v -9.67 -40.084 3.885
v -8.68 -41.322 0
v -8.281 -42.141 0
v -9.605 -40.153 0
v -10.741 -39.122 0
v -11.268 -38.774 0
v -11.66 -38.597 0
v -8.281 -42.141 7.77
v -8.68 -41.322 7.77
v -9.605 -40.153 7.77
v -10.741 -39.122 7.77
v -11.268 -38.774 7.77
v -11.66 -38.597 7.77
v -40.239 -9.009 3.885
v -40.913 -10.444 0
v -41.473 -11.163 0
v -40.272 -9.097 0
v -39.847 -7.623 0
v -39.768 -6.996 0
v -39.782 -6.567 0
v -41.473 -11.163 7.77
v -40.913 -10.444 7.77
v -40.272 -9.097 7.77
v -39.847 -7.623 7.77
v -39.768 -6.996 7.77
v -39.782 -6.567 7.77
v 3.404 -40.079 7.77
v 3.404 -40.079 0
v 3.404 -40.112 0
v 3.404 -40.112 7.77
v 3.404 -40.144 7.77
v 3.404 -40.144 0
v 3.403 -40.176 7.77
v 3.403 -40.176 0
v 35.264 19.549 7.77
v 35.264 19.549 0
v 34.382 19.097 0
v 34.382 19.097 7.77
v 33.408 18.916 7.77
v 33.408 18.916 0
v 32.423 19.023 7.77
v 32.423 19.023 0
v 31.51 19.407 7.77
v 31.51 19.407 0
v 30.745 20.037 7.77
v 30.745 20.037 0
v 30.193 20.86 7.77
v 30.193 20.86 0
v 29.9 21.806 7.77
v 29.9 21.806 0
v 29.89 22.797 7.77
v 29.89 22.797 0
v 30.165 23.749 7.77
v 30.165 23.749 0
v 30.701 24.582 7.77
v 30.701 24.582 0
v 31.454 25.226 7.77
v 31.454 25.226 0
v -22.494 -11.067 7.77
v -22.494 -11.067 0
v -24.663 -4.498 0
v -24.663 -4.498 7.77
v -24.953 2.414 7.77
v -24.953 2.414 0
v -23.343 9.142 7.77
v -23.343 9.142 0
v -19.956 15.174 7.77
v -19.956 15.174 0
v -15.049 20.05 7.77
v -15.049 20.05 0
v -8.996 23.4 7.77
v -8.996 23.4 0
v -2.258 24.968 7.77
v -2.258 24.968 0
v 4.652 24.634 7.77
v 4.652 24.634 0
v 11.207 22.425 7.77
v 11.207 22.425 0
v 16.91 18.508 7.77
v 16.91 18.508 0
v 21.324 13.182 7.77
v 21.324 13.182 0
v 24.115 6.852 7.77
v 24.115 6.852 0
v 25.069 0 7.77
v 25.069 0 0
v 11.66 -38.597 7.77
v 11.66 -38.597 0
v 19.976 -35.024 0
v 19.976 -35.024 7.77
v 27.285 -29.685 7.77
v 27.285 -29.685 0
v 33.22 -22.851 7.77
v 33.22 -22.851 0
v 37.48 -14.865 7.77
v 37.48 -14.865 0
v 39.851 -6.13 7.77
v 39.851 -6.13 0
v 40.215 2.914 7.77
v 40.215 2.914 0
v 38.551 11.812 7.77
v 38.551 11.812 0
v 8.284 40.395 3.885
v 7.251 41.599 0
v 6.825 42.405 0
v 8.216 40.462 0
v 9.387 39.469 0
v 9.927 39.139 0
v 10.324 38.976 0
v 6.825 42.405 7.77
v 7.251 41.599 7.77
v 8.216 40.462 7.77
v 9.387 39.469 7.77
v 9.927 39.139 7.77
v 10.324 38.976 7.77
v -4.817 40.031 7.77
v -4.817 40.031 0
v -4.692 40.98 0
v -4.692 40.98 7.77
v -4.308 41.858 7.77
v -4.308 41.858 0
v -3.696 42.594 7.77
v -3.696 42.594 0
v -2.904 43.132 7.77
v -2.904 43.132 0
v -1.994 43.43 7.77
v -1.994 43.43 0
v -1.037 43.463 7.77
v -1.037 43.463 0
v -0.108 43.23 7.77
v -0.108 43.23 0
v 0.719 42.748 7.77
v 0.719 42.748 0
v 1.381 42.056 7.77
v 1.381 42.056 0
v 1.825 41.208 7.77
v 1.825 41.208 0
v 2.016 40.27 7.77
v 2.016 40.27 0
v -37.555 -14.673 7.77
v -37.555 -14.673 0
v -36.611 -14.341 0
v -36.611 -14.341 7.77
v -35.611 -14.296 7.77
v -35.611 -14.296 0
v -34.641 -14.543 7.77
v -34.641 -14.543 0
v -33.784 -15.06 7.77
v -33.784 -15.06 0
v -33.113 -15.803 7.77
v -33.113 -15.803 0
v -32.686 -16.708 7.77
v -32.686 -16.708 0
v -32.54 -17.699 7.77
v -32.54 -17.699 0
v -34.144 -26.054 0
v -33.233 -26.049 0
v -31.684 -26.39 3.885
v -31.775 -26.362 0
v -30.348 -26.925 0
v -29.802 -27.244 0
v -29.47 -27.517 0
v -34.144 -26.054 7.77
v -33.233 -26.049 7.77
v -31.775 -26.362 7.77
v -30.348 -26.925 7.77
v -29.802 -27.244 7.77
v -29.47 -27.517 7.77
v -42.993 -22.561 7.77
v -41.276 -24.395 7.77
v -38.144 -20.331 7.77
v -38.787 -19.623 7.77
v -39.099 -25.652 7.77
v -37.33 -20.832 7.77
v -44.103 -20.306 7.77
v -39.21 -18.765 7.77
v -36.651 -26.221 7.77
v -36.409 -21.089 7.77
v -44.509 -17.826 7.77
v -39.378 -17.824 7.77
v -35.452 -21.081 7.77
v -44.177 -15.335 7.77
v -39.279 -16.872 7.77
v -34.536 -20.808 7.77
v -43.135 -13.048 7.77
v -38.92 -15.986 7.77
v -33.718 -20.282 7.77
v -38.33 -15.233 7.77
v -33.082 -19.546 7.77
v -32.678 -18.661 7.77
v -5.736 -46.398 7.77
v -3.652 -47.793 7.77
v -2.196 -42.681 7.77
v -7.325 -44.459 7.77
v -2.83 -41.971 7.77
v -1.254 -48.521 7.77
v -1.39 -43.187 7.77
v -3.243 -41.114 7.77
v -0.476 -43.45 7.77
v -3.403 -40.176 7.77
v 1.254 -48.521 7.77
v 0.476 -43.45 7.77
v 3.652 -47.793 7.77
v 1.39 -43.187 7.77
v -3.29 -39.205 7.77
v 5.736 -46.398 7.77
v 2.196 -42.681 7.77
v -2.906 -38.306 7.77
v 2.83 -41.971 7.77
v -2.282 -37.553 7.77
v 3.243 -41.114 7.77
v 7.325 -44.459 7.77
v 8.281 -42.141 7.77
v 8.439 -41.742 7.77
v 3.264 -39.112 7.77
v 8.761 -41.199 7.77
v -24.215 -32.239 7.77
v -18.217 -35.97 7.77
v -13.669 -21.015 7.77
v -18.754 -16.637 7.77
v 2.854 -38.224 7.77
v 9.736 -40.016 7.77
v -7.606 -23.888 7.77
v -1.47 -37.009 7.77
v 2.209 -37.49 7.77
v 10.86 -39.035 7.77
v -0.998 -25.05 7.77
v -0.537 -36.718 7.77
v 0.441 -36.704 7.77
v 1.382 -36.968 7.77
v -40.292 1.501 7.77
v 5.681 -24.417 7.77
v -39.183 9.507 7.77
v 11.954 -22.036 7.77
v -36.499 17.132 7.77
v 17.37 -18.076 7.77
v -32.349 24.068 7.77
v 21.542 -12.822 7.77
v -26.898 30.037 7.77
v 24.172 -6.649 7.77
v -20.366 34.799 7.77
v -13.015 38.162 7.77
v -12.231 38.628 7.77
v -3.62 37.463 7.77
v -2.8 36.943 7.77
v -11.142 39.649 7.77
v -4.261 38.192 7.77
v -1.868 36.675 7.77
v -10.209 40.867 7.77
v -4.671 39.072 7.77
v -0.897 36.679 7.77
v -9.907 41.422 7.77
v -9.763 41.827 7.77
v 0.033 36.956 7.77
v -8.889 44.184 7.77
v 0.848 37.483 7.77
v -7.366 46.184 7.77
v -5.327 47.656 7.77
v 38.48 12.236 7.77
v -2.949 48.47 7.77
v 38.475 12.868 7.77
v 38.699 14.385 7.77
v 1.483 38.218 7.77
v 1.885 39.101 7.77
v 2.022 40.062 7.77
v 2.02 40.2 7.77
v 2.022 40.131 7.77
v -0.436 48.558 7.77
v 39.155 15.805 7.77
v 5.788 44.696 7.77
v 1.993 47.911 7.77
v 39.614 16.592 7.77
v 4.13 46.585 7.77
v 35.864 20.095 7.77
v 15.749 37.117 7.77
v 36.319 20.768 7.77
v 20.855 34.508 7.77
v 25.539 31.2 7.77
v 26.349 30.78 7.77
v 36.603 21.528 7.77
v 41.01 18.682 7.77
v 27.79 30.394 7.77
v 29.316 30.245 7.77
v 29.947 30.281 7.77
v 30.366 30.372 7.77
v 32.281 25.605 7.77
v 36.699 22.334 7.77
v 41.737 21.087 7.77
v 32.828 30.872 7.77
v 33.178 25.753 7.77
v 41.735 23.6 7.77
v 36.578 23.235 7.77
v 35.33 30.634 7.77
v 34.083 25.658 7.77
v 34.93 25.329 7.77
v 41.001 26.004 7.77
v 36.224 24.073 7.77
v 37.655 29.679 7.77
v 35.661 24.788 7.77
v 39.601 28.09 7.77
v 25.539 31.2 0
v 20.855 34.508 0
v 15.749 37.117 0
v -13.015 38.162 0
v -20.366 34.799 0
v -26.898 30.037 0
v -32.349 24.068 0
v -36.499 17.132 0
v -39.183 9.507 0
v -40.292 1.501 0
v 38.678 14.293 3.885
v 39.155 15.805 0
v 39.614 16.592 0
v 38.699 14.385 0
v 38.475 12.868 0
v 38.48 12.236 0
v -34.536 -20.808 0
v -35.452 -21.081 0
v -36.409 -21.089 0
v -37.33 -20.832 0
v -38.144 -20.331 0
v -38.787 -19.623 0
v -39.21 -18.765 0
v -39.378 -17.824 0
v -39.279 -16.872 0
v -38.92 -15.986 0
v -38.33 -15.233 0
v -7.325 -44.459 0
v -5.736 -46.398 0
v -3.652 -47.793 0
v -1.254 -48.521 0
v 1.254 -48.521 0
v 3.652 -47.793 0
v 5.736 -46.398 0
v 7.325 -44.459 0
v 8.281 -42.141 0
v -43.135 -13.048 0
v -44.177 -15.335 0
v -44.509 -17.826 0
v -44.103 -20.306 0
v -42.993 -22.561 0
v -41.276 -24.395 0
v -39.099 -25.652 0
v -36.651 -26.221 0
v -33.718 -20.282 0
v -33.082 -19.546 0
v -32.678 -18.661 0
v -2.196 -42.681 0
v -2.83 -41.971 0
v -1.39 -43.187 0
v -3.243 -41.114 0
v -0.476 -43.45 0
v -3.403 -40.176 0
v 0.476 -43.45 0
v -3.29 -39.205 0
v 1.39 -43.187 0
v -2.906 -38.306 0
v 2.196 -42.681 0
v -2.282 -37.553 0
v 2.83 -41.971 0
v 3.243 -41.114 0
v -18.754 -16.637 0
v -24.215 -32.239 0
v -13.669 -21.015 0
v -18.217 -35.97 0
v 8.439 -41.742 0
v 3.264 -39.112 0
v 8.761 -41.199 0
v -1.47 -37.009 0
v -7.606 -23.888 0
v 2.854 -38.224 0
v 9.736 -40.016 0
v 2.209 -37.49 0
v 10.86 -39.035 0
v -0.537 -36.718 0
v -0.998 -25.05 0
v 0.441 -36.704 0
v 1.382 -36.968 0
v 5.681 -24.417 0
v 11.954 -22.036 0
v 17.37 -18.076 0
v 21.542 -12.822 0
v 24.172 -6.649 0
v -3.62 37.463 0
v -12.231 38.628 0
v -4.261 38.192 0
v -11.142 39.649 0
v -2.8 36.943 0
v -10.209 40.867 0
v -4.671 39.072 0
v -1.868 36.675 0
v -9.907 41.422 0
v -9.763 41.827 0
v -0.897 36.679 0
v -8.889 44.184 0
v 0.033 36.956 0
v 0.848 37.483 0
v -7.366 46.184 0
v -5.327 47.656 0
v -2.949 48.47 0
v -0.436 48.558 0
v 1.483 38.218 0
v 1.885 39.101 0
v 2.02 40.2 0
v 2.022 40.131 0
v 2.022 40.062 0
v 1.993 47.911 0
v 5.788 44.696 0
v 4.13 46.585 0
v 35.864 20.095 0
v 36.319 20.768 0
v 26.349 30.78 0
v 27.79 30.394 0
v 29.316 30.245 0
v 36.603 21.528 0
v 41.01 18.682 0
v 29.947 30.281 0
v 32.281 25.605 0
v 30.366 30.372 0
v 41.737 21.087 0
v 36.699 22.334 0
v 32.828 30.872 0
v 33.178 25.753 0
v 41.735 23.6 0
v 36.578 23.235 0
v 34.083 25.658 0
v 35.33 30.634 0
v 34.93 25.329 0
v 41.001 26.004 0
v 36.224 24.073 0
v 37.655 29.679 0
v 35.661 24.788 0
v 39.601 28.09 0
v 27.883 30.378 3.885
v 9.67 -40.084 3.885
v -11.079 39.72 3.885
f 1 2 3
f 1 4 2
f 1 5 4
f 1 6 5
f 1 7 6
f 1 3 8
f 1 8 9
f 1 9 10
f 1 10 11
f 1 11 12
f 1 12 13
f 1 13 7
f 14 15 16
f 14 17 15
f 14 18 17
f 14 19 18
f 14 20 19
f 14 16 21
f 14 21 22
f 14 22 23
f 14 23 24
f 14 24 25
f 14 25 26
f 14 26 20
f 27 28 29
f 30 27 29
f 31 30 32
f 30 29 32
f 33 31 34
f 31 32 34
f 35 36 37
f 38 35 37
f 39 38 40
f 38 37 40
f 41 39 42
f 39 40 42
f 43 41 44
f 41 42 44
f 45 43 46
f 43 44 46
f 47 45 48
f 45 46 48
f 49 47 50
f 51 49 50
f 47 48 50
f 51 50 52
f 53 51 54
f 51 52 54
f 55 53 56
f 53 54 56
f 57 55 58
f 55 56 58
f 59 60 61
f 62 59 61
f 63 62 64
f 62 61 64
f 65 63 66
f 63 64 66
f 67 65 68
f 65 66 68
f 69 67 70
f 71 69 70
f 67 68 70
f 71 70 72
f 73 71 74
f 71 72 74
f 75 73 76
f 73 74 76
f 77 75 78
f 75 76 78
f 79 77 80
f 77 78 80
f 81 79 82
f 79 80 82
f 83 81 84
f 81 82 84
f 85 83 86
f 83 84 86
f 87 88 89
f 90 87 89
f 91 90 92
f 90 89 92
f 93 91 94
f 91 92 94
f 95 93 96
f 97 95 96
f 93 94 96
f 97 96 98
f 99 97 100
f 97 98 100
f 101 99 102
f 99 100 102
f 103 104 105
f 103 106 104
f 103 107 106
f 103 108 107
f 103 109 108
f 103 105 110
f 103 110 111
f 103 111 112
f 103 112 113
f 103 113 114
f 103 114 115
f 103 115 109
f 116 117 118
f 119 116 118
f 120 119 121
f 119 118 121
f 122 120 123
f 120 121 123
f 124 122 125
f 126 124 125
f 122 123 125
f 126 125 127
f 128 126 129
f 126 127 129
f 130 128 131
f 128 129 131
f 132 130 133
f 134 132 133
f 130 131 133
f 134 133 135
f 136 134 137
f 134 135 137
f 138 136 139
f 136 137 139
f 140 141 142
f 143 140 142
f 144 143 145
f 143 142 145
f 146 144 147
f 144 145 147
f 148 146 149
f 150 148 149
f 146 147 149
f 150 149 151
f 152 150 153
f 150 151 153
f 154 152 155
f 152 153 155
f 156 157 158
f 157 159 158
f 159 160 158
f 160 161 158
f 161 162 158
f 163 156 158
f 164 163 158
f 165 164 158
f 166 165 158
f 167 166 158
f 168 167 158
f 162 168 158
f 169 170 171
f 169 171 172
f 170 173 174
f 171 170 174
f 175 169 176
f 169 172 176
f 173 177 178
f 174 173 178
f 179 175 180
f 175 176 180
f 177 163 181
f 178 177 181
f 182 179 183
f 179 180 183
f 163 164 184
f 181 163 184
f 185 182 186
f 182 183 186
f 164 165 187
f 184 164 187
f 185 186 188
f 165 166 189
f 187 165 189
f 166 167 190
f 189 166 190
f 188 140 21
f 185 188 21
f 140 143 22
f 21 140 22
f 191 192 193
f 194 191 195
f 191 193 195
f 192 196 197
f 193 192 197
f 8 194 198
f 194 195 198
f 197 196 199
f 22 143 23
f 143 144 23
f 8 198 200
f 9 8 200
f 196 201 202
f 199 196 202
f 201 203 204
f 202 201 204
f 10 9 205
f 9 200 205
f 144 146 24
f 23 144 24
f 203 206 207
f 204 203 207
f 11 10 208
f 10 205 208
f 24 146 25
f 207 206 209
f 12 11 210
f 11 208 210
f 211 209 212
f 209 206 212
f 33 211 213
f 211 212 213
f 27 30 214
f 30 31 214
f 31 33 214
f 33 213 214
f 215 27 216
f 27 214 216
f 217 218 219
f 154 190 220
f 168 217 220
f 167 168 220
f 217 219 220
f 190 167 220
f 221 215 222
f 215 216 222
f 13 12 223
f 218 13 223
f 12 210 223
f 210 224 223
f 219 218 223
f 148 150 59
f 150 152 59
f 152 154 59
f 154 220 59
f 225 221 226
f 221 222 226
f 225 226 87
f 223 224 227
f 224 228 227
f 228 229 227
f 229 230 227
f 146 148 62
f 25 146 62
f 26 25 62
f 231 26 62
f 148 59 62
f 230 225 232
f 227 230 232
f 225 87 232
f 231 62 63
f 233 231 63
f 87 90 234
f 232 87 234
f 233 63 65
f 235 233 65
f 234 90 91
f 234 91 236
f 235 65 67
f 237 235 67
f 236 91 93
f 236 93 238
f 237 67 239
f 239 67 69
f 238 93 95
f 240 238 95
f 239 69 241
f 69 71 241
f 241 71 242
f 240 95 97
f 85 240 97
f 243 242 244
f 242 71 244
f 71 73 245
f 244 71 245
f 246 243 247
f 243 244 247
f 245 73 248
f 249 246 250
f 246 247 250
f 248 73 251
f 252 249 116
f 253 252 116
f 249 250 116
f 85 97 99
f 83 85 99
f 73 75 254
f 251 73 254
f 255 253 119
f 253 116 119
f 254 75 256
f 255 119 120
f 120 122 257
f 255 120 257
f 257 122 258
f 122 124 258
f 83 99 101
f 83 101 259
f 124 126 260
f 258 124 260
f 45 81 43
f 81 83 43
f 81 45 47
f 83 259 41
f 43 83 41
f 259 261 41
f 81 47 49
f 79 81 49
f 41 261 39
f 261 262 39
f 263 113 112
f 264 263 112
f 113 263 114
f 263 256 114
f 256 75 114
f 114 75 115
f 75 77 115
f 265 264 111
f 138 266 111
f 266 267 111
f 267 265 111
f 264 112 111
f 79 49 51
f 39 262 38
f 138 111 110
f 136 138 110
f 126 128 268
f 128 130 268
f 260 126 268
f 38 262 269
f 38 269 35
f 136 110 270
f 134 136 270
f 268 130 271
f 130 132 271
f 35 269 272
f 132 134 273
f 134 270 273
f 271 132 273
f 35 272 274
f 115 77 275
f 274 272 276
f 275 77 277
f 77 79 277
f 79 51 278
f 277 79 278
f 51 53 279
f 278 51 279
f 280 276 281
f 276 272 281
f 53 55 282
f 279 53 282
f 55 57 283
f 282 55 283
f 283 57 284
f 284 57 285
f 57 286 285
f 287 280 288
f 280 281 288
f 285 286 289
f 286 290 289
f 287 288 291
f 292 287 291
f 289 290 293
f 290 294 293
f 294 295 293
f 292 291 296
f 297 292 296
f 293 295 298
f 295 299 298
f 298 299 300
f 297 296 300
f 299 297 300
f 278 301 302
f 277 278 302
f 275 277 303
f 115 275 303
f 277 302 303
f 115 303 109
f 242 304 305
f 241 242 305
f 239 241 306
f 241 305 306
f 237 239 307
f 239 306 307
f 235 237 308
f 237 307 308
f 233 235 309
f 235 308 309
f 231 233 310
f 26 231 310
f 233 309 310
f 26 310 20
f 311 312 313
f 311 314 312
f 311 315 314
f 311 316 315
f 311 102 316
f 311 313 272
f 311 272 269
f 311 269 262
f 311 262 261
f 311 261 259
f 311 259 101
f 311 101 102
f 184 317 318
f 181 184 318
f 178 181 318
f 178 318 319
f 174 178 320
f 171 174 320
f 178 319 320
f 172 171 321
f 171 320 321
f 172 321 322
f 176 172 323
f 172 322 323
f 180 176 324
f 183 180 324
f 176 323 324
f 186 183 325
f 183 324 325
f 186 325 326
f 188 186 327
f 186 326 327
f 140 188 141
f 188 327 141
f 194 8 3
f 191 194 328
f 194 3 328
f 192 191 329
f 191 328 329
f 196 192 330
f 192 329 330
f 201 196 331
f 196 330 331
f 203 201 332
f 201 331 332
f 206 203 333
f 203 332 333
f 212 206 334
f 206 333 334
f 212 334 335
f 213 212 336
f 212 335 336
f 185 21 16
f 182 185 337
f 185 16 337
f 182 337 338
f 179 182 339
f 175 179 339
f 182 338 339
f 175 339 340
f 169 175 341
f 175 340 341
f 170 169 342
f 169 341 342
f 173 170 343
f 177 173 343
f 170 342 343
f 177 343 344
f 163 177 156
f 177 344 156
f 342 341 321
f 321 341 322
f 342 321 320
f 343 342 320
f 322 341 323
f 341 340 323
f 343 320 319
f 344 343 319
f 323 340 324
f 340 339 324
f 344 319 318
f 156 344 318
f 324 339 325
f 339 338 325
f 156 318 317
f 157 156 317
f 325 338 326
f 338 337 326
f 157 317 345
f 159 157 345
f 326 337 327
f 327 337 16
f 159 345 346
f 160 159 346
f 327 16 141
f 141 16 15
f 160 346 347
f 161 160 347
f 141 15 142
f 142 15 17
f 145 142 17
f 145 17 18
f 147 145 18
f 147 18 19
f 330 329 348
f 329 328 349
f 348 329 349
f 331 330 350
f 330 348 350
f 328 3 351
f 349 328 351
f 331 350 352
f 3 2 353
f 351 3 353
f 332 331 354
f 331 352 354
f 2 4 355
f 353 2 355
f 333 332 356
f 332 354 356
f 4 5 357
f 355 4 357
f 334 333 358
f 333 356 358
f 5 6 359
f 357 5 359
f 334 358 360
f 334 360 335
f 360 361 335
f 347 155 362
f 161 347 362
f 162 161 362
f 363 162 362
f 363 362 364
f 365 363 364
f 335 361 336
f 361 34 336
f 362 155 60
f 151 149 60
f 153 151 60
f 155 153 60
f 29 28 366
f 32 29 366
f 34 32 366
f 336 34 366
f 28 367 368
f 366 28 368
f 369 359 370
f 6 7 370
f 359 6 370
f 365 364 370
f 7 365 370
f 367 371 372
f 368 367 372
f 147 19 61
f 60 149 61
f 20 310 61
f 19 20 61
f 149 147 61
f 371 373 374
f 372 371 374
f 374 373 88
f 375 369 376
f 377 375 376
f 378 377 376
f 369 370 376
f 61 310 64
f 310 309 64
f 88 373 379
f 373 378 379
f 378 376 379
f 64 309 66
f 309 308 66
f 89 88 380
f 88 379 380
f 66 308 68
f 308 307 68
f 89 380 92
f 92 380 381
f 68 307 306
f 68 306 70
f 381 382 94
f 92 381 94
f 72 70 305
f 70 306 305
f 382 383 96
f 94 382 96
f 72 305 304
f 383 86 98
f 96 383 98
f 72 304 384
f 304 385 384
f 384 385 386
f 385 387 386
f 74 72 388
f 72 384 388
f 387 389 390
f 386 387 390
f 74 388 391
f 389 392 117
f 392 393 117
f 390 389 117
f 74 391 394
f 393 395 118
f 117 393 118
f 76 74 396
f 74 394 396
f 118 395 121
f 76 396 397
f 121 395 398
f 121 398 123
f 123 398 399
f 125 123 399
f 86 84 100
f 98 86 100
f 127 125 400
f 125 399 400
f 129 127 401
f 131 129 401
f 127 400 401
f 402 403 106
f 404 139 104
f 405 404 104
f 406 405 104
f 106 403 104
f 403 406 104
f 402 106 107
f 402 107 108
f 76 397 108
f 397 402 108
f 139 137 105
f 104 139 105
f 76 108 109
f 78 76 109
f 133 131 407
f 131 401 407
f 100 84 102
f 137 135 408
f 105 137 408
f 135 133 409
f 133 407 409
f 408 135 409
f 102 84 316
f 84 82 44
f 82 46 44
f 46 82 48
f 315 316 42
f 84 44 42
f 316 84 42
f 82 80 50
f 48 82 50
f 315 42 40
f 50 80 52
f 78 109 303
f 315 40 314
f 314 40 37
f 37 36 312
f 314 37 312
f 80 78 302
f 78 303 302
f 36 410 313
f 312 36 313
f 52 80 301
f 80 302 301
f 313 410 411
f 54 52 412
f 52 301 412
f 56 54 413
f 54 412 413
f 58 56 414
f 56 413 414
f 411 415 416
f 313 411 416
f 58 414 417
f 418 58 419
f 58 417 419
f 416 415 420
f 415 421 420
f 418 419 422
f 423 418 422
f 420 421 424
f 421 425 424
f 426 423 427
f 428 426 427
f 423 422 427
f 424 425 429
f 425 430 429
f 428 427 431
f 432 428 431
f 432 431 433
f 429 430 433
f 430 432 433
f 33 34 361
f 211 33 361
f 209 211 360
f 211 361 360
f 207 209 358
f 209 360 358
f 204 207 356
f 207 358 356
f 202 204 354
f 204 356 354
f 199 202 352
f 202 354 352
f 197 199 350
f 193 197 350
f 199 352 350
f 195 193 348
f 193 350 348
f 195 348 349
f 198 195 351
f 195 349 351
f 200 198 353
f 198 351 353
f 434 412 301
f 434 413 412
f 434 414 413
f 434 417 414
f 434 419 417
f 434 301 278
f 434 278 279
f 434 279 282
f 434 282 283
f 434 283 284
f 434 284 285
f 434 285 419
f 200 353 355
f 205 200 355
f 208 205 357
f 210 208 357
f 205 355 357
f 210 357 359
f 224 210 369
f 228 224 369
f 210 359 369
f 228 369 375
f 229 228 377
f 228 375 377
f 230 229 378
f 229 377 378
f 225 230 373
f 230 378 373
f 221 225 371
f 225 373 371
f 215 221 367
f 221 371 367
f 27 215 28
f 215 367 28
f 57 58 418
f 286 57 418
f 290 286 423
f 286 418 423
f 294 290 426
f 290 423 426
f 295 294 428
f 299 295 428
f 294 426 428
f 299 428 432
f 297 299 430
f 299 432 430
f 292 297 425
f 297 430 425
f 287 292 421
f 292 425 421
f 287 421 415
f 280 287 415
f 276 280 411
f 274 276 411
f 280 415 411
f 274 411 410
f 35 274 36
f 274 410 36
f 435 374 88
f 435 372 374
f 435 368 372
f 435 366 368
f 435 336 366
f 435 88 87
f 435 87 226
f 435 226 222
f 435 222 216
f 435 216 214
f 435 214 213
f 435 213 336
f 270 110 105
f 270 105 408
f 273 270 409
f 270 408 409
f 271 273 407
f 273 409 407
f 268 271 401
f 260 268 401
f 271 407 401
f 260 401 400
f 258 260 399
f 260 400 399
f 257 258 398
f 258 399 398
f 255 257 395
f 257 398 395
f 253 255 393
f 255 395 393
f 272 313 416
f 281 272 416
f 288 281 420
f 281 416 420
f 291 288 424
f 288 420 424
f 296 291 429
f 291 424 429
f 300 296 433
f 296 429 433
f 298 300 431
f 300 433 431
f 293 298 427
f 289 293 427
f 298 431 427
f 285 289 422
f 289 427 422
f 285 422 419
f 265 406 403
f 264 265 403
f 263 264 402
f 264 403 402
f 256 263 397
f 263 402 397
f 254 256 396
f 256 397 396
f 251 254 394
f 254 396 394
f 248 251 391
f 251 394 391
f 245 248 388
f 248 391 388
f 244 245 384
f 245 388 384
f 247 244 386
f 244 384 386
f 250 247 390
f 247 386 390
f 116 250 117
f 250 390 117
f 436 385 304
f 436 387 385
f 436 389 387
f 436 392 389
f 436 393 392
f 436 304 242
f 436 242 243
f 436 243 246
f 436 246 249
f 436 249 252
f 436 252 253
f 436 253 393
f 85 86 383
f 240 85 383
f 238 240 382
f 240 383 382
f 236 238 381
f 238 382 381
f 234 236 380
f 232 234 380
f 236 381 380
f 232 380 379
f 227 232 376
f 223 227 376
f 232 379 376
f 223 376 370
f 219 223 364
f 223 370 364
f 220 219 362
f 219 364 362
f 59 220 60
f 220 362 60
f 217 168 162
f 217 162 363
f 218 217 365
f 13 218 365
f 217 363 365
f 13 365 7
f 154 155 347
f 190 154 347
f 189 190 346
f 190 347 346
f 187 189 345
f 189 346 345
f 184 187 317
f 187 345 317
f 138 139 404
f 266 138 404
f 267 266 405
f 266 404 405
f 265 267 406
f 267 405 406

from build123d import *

# Parameters (mm, degrees)
BOSS_EXTRUDE1_DEPTH = 7.77


with BuildPart() as part:
    # Sketch1 → Boss-Extrude1 (new body)
    # profile 1 of 5: a face of its own
    with BuildSketch(Plane.XY):
        with BuildLine():
            ThreePointArc((3.404182759, -40.079440399), (3.403839221, -40.127801725), (3.402808675, -40.176153289))
            ThreePointArc((3.402808675, -40.176153289), (5.967670482, -39.875923927), (8.508052822, -39.412122972))
            ThreePointArc((8.508052822, -39.412122972), (35.574552979, -18.977712726), (37.472579791, 14.883150333))
            ThreePointArc((37.472579791, 14.883150333), (36.442962914, 17.251459476), (35.263848757, 19.548999228))
            ThreePointArc((35.263848757, 19.548999228), (30.43912953, 20.428209113), (31.453728524, 25.226283157))
            ThreePointArc((31.453728524, 25.226283157), (29.774333348, 27.188075947), (27.972797119, 29.038337096))
            ThreePointArc((27.972797119, 29.038337096), (18.347193458, 35.903800526), (7.14399719, 39.682057711))
            ThreePointArc((7.14399719, 39.682057711), (4.589484945, 40.057945878), (2.016151733, 40.269560864))
            ThreePointArc((2.016151733, 40.269560864), (2.020874049, 40.165888855), (2.022448638, 40.062121295))
            ThreePointArc((2.022448638, 40.062121295), (-1.382077907, 36.642156299), (-4.817411346, 40.031174701))
            ThreePointArc((-4.817411346, 40.031174701), (-7.369742742, 39.640752918), (-9.891851642, 39.087768817))
            ThreePointArc((-9.891851642, 39.087768817), (-34.597565404, 20.705334291), (-39.122221714, -9.7546998))
            ThreePointArc((-39.122221714, -9.7546998), (-38.417536694, -12.239087971), (-37.555259765, -14.673270392))
            ThreePointArc((-37.555259765, -14.673270392), (-34.193471955, -14.769982316), (-32.539881663, -17.698567233))
            ThreePointArc((-32.539881663, -17.698567233), (-33.081813677, -19.546068243), (-34.535867272, -20.808081887))
            ThreePointArc((-34.535867272, -20.808081887), (-33.133010631, -22.976205225), (-31.594239644, -25.05007827))
            ThreePointArc((-31.594239644, -25.05007827), (-21.298252211, -34.235754012), (-8.508052822, -39.412122972))
            ThreePointArc((-8.508052822, -39.412122972), (-5.967670482, -39.875923927), (-3.402808675, -40.176153289))
            ThreePointArc((-3.402808675, -40.176153289), (-0.048361325, -36.675601178), (3.404182759, -40.079440399))
        make_face()
        with BuildLine():
            ThreePointArc((-22.494419384, -11.066975129), (-5.681299846, 24.417200372), (25.069440399, 0))
            ThreePointArc((25.069440399, 0), (5.681299846, -24.417200372), (-22.494419384, -11.066975129))
        make_face(mode=Mode.SUBTRACT)
    # profile 2 of 5: a face of its own
    with BuildSketch(Plane.XY):
        with BuildLine():
            ThreePointArc((35.263848757, 19.548999228), (36.442962914, 17.251459476), (37.472579791, 14.883150333))
            ThreePointArc((37.472579791, 14.883150333), (40.378310636, 27.098559849), (27.972797119, 29.038337096))
            ThreePointArc((27.972797119, 29.038337096), (29.774333348, 27.188075947), (31.453728524, 25.226283157))
            ThreePointArc((31.453728524, 25.226283157), (34.9303084, 25.328891825), (36.69889556, 22.334023609))
            ThreePointArc((36.69889556, 22.334023609), (36.319038644, 20.767521125), (35.263848757, 19.548999228))
        make_face()
    # profile 3 of 5: a face of its own
    with BuildSketch(Plane.XY):
        with BuildLine():
            ThreePointArc((2.016151733, 40.269560864), (4.589484945, 40.057945878), (7.14399719, 39.682057711))
            ThreePointArc((7.14399719, 39.682057711), (-1.695633435, 48.606923637), (-9.891851642, 39.087768817))
            ThreePointArc((-9.891851642, 39.087768817), (-7.369742742, 39.640752918), (-4.817411346, 40.031174701))
            ThreePointArc((-4.817411346, 40.031174701), (-1.516784191, 43.480042232), (2.016151733, 40.269560864))
        make_face()
    # profile 4 of 5: a face of its own
    with BuildSketch(Plane.XY):
        with BuildLine():
            ThreePointArc((-39.122221714, -9.7546998), (-43.631335255, -21.474193014), (-31.594239644, -25.05007827))
            ThreePointArc((-31.594239644, -25.05007827), (-33.133010631, -22.976205225), (-34.535867272, -20.808081887))
            ThreePointArc((-34.535867272, -20.808081887), (-39.028605211, -19.208850623), (-37.555259765, -14.673270392))
            ThreePointArc((-37.555259765, -14.673270392), (-38.417536694, -12.239087971), (-39.122221714, -9.7546998))
        make_face()
    # profile 5 of 5: a face of its own
    with BuildSketch(Plane.XY):
        with BuildLine():
            ThreePointArc((8.508052822, -39.412122972), (5.967670482, -39.875923927), (3.402808675, -40.176153289))
            ThreePointArc((3.402808675, -40.176153289), (0, -43.483623159), (-3.402808675, -40.176153289))
            ThreePointArc((-3.402808675, -40.176153289), (-5.967670482, -39.875923927), (-8.508052822, -39.412122972))
            ThreePointArc((-8.508052822, -39.412122972), (0, -48.613623159), (8.508052822, -39.412122972))
        make_face()
    extrude(amount=BOSS_EXTRUDE1_DEPTH)

    # Fillet1
    # a fillet whose section is not a circle: 5 mm, written as the material it adds along each edge (its section moved 0.00015 mm through the faces so that the kernel can cut it)
    with BuildSketch(Plane(origin=(27.972797119, 29.038337096, 0), x_dir=(-0.7478052572443031, 0.6639181404644565, 0), z_dir=(0, 0, 1))) as fillet1_piece_1:
        with BuildLine():
            Bezier((3.27455803, 0), (0.443727696, -0.114917188), (-0.912581333, -2.602331942), weights=[1, 0.435020662, 1])
            Line((-0.912581333, -2.602331942), (-1.000377754, -2.554459315))
            ThreePointArc((-1.000377754, -2.554459315), (-0.444974343, -1.30513366), (-0.098468347, 0.017435156))
            Line((-0.098468347, 0.017435156), (0.004065293, 0.099917333))
            ThreePointArc((0.004065293, 0.099917333), (1.637282071, 0.066668632), (3.270501884, 0.099917705))
            Line((3.270501884, 0.099917705), (3.27455803, 0))
        make_face()
    extrude(amount=7.77)
    with BuildSketch(Plane(origin=(37.472579791, 14.883150333, 0), x_dir=(0.7809050051368507, 0.62464980024988, 0), z_dir=(0, 0, 1))) as fillet1_piece_2:
        with BuildLine():
            Bezier((2.757704884, 0), (-0.038396039, -0.456755922), (-1.083618682, -3.090064861), weights=[1, 0.435020662, 1])
            Line((-1.083618682, -3.090064861), (-1.176564622, -3.053172417))
            ThreePointArc((-1.176564622, -3.053172417), (-0.604722781, -1.522973292), (-0.09563314, 0.029228455))
            Line((-0.09563314, 0.029228455), (0.016132368, 0.098690155))
            ThreePointArc((0.016132368, 0.098690155), (1.378851781, -0.011991736), (2.741583111, 0.098691886))
            Line((2.741583111, 0.098691886), (2.757704884, 0))
        make_face()
    extrude(amount=7.77)
    with BuildSketch(Plane(origin=(-9.891851642, 39.087768817, 0), x_dir=(-0.9586545512733944, -0.2845724008452099, 0), z_dir=(0, 0, 1))) as fillet1_piece_3:
        with BuildLine():
            Bezier((3.277172257, 0), (0.444362291, -0.115089718), (-0.911320112, -2.605106418), weights=[1, 0.434946583, 1])
            Line((-0.911320112, -2.605106418), (-0.999146838, -2.557289411))
            ThreePointArc((-0.999146838, -2.557289411), (-0.444170839, -1.306571665), (-0.0984839, 0.017347088))
            Line((-0.0984839, 0.017347088), (0.004068531, 0.099917201))
            ThreePointArc((0.004068531, 0.099917201), (1.63858918, 0.066615488), (3.273112865, 0.099917573))
            Line((3.273112865, 0.099917573), (3.277172257, 0))
        make_face()
    extrude(amount=7.77)
    with BuildSketch(Plane(origin=(7.14399719, 39.682057711, 0), x_dir=(-0.11742410292813261, 0.9930818596931088, 0), z_dir=(0, 0, 1))) as fillet1_piece_4:
        with BuildLine():
            Bezier((2.759906483, 0), (-0.038093802, -0.45744109), (-1.082121081, -3.093359334), weights=[1, 0.434946583, 1])
            Line((-1.082121081, -3.093359334), (-1.175093979, -3.056534883))
            ThreePointArc((-1.175093979, -3.056534883), (-0.603940648, -1.524686137), (-0.095656384, 0.029152292))
            Line((-0.095656384, 0.029152292), (0.016145239, 0.09868805))
            ThreePointArc((0.016145239, 0.09868805), (1.379952571, -0.012171692), (2.743771831, 0.098689782))
            Line((2.743771831, 0.098689782), (2.759906483, 0))
        make_face()
    extrude(amount=7.77)
    with BuildSketch(Plane(origin=(-39.122221714, -9.7546998, 0), x_dir=(-0.8572531161014109, -0.5148952271427859, 0), z_dir=(0, 0, 1))) as fillet1_piece_5:
        with BuildLine():
            Bezier((2.757951127, 0), (-0.038361657, -0.456825585), (-1.083457749, -3.090421787), weights=[1, 0.435012441, 1])
            Line((-1.083457749, -3.090421787), (-1.176406599, -3.053536679))
            ThreePointArc((-1.176406599, -3.053536679), (-0.604638694, -1.523158848), (-0.095635652, 0.029220234))
            Line((-0.095635652, 0.029220234), (0.016133572, 0.098689958))
            ThreePointArc((0.016133572, 0.098689958), (1.378974902, -0.012010201), (2.741828149, 0.09869169))
            Line((2.741828149, 0.09869169), (2.757951127, 0))
        make_face()
    extrude(amount=7.77)
    with BuildSketch(Plane(origin=(-31.594239644, -25.05007827, 0), x_dir=(-0.9309287843318478, -0.36520076465203083, 0), z_dir=(0, 0, 1))) as fillet1_piece_6:
        with BuildLine():
            Bezier((2.757951127, 0), (-0.038361657, 0.456825585), (-1.083457749, 3.090421787), weights=[1, 0.435012441, 1])
            Line((-1.083457749, 3.090421787), (-1.176406599, 3.053536679))
            ThreePointArc((-1.176406599, 3.053536679), (-0.604638694, 1.523158848), (-0.095635652, -0.029220234))
            Line((-0.095635652, -0.029220234), (0.016133572, -0.098689958))
            ThreePointArc((0.016133572, -0.098689958), (1.378974902, 0.012010201), (2.741828149, -0.09869169))
            Line((2.741828149, -0.09869169), (2.757951127, 0))
        make_face()
    extrude(amount=7.77)
    with BuildSketch(Plane(origin=(-8.508052822, -39.412122972, 0), x_dir=(0.08389843348969565, -0.9964743111881886, 0), z_dir=(0, 0, 1))) as fillet1_piece_7:
        with BuildLine():
            Bezier((2.756625198, 0), (-0.038622025, -0.457301683), (-1.083539201, -3.089920144), weights=[1, 0.435048815, 1])
            Line((-1.083539201, -3.089920144), (-1.17648552, -3.053028659))
            ThreePointArc((-1.17648552, -3.053028659), (-0.604686345, -1.522900359), (-0.095633323, 0.029227856))
            Line((-0.095633323, 0.029227856), (0.016155935, 0.0986863))
            ThreePointArc((0.016155935, 0.0986863), (1.378311931, -0.012113558), (2.740479863, 0.098688034))
            Line((2.740479863, 0.098688034), (2.756625198, 0))
        make_face()
    extrude(amount=7.77)
    with BuildSketch(Plane(origin=(8.508052822, -39.412122972, 0), x_dir=(0.968097352048771, 0.25057437410109984, 0), z_dir=(0, 0, 1))) as fillet1_piece_8:
        with BuildLine():
            Bezier((3.274395165, 0), (0.444318442, -0.114880859), (-0.912202503, -2.601320641), weights=[1, 0.435048815, 1])
            Line((-0.912202503, -2.601320641), (-0.999987888, -2.553427781))
            ThreePointArc((-0.999987888, -2.553427781), (-0.444669934, -1.304668221), (-0.098472652, 0.017410827))
            Line((-0.098472652, 0.017410827), (0.004065091, 0.099917341))
            ThreePointArc((0.004065091, 0.099917341), (1.637200639, 0.066671941), (3.270339221, 0.099917713))
            Line((3.270339221, 0.099917713), (3.274395165, 0))
        make_face()
    extrude(amount=7.77)


solid = part.part
